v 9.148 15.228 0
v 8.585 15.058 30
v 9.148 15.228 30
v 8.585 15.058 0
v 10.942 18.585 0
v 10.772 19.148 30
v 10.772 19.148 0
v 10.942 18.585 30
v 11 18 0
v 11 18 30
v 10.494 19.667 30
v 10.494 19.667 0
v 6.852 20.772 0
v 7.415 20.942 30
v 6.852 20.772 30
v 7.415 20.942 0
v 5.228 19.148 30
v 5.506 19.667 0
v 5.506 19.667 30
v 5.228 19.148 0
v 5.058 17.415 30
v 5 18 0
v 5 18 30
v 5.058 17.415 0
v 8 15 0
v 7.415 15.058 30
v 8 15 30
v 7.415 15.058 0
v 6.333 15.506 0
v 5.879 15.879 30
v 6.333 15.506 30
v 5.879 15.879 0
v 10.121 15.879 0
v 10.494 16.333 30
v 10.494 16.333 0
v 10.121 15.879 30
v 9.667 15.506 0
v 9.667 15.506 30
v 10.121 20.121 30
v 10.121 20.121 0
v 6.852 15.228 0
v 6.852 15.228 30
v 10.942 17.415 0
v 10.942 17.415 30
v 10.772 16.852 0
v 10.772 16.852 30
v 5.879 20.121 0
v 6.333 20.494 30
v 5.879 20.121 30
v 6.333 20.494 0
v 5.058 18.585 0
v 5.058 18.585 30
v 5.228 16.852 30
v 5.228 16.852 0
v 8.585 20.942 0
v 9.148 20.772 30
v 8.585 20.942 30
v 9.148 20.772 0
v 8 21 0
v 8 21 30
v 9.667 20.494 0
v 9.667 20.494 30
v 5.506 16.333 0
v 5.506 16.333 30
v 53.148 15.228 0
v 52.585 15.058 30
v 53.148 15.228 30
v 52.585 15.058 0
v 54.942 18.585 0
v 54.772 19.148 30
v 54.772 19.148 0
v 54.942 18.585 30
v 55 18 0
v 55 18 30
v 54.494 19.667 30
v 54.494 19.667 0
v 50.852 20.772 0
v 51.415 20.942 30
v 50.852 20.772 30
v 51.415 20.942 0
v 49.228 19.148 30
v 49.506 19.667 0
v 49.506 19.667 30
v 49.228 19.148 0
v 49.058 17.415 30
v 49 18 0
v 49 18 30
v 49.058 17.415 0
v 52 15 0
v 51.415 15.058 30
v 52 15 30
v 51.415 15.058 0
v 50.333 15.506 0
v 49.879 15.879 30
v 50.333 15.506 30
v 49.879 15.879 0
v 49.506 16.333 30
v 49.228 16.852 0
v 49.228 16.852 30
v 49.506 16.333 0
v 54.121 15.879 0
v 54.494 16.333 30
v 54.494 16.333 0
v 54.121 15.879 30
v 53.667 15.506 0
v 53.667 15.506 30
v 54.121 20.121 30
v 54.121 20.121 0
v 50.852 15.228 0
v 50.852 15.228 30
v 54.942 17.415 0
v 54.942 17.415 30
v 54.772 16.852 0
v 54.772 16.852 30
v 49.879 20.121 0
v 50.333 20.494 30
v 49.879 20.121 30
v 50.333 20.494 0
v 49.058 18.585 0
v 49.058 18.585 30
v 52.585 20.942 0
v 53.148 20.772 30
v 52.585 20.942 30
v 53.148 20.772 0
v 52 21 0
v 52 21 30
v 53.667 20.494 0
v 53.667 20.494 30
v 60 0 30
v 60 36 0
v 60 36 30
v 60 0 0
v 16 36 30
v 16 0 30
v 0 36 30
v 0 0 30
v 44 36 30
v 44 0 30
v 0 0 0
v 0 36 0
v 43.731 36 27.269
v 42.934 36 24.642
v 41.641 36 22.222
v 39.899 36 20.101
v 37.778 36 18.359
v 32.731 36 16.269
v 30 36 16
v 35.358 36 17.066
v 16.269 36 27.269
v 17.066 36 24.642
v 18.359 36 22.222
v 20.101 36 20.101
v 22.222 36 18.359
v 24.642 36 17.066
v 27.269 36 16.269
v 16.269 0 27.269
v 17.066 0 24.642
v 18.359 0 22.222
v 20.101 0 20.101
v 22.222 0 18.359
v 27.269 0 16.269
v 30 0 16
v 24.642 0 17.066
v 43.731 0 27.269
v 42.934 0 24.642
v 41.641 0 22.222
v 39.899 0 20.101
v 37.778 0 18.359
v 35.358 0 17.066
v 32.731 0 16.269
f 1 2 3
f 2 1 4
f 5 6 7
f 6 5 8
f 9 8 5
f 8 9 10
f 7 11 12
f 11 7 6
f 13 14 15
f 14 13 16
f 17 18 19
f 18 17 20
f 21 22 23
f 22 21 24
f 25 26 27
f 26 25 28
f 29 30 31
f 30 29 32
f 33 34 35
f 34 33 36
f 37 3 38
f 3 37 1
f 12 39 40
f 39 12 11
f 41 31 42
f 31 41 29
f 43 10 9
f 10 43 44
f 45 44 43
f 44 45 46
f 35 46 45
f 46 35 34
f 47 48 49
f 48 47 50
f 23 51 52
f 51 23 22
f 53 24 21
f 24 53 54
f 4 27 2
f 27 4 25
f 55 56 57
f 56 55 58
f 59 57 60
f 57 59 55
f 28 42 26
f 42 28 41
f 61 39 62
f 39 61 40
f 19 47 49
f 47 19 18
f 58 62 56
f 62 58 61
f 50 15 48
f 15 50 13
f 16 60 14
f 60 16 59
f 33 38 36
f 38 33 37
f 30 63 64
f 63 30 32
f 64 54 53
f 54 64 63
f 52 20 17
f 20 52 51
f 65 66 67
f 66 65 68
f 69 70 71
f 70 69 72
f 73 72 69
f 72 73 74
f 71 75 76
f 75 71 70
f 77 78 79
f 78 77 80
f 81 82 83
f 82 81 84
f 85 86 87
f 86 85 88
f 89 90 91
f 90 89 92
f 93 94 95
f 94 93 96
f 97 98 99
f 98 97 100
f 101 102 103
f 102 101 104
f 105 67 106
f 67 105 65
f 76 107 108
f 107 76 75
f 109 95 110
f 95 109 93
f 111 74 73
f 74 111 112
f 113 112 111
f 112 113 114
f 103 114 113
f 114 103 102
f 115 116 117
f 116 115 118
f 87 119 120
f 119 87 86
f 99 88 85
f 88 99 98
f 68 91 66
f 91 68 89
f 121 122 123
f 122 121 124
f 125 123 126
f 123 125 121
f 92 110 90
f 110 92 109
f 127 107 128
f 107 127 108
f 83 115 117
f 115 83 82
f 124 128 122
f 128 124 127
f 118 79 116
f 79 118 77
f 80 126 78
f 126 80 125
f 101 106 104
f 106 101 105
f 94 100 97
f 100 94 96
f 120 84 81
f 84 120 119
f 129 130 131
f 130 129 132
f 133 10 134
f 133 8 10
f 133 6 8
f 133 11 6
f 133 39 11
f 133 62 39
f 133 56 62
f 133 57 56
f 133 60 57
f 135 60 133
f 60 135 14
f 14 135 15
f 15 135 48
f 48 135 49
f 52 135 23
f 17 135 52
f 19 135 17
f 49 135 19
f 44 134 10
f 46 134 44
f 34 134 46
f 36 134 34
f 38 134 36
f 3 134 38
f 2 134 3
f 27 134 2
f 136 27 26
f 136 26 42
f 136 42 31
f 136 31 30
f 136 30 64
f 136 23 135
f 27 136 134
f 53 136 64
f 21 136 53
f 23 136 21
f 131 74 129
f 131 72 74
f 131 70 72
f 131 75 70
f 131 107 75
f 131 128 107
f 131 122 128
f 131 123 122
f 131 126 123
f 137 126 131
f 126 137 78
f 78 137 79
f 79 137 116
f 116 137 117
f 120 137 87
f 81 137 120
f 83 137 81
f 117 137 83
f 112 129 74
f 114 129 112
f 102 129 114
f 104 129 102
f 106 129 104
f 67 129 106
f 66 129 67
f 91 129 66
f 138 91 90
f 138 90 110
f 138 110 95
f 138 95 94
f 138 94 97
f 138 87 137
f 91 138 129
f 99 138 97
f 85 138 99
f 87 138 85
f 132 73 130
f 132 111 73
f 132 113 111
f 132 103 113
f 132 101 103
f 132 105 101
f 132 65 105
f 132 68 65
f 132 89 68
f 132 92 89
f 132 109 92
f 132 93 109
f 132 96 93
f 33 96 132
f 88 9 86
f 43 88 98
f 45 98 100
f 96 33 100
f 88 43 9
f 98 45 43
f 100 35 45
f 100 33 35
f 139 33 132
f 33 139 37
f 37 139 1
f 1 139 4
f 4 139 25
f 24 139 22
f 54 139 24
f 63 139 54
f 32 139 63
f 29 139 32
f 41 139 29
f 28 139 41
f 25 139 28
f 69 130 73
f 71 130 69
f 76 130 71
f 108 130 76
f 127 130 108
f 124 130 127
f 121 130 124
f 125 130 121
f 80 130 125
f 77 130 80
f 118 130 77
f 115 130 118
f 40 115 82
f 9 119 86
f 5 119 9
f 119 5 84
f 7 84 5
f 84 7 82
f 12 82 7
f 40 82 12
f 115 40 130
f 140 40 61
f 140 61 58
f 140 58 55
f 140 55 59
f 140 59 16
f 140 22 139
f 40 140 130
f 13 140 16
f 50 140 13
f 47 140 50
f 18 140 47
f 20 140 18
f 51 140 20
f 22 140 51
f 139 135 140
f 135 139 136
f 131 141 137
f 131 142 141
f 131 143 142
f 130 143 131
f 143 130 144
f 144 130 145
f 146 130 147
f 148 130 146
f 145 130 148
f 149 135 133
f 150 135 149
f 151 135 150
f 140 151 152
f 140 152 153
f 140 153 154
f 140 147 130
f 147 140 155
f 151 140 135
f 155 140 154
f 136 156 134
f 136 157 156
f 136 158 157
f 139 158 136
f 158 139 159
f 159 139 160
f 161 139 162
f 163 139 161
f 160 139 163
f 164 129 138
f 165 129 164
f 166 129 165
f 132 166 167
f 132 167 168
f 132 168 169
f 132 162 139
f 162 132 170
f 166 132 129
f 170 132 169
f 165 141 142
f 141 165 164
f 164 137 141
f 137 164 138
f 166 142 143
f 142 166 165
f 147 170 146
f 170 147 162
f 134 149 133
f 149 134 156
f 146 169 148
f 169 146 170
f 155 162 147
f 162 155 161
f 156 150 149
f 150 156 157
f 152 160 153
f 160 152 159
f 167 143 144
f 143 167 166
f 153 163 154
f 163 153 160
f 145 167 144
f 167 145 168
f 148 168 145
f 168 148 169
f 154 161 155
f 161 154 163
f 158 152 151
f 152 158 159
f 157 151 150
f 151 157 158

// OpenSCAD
$fn = 32;

// ----------------------------------------------------------------------
// Saddle clamp: plain shaft clamp
// ----------------------------------------------------------------------

// --- parameters (mm) ---
blk_l = 60;               // block length, X
blk_w = 36;               // block width, Y
blk_h = 30;               // block height
clamp_r = 14;             // shaft groove radius
hole_r = 3;               // bolt hole radius
hole_m = 8;               // bolt hole margin from the ends

saw_depth = clamp_r + 3;  // saw kerf depth

difference() {
  cube([blk_l, blk_w, blk_h]);
  translate([blk_l / 2, -1, blk_h])
    rotate([-90, 0, 0])
      cylinder(h = blk_w + 2, r = clamp_r);
  for (sx = [0, 1])
    translate([sx ? blk_l - hole_m : hole_m, blk_w / 2, -1])
      cylinder(r = hole_r, h = blk_h + 2);
}
